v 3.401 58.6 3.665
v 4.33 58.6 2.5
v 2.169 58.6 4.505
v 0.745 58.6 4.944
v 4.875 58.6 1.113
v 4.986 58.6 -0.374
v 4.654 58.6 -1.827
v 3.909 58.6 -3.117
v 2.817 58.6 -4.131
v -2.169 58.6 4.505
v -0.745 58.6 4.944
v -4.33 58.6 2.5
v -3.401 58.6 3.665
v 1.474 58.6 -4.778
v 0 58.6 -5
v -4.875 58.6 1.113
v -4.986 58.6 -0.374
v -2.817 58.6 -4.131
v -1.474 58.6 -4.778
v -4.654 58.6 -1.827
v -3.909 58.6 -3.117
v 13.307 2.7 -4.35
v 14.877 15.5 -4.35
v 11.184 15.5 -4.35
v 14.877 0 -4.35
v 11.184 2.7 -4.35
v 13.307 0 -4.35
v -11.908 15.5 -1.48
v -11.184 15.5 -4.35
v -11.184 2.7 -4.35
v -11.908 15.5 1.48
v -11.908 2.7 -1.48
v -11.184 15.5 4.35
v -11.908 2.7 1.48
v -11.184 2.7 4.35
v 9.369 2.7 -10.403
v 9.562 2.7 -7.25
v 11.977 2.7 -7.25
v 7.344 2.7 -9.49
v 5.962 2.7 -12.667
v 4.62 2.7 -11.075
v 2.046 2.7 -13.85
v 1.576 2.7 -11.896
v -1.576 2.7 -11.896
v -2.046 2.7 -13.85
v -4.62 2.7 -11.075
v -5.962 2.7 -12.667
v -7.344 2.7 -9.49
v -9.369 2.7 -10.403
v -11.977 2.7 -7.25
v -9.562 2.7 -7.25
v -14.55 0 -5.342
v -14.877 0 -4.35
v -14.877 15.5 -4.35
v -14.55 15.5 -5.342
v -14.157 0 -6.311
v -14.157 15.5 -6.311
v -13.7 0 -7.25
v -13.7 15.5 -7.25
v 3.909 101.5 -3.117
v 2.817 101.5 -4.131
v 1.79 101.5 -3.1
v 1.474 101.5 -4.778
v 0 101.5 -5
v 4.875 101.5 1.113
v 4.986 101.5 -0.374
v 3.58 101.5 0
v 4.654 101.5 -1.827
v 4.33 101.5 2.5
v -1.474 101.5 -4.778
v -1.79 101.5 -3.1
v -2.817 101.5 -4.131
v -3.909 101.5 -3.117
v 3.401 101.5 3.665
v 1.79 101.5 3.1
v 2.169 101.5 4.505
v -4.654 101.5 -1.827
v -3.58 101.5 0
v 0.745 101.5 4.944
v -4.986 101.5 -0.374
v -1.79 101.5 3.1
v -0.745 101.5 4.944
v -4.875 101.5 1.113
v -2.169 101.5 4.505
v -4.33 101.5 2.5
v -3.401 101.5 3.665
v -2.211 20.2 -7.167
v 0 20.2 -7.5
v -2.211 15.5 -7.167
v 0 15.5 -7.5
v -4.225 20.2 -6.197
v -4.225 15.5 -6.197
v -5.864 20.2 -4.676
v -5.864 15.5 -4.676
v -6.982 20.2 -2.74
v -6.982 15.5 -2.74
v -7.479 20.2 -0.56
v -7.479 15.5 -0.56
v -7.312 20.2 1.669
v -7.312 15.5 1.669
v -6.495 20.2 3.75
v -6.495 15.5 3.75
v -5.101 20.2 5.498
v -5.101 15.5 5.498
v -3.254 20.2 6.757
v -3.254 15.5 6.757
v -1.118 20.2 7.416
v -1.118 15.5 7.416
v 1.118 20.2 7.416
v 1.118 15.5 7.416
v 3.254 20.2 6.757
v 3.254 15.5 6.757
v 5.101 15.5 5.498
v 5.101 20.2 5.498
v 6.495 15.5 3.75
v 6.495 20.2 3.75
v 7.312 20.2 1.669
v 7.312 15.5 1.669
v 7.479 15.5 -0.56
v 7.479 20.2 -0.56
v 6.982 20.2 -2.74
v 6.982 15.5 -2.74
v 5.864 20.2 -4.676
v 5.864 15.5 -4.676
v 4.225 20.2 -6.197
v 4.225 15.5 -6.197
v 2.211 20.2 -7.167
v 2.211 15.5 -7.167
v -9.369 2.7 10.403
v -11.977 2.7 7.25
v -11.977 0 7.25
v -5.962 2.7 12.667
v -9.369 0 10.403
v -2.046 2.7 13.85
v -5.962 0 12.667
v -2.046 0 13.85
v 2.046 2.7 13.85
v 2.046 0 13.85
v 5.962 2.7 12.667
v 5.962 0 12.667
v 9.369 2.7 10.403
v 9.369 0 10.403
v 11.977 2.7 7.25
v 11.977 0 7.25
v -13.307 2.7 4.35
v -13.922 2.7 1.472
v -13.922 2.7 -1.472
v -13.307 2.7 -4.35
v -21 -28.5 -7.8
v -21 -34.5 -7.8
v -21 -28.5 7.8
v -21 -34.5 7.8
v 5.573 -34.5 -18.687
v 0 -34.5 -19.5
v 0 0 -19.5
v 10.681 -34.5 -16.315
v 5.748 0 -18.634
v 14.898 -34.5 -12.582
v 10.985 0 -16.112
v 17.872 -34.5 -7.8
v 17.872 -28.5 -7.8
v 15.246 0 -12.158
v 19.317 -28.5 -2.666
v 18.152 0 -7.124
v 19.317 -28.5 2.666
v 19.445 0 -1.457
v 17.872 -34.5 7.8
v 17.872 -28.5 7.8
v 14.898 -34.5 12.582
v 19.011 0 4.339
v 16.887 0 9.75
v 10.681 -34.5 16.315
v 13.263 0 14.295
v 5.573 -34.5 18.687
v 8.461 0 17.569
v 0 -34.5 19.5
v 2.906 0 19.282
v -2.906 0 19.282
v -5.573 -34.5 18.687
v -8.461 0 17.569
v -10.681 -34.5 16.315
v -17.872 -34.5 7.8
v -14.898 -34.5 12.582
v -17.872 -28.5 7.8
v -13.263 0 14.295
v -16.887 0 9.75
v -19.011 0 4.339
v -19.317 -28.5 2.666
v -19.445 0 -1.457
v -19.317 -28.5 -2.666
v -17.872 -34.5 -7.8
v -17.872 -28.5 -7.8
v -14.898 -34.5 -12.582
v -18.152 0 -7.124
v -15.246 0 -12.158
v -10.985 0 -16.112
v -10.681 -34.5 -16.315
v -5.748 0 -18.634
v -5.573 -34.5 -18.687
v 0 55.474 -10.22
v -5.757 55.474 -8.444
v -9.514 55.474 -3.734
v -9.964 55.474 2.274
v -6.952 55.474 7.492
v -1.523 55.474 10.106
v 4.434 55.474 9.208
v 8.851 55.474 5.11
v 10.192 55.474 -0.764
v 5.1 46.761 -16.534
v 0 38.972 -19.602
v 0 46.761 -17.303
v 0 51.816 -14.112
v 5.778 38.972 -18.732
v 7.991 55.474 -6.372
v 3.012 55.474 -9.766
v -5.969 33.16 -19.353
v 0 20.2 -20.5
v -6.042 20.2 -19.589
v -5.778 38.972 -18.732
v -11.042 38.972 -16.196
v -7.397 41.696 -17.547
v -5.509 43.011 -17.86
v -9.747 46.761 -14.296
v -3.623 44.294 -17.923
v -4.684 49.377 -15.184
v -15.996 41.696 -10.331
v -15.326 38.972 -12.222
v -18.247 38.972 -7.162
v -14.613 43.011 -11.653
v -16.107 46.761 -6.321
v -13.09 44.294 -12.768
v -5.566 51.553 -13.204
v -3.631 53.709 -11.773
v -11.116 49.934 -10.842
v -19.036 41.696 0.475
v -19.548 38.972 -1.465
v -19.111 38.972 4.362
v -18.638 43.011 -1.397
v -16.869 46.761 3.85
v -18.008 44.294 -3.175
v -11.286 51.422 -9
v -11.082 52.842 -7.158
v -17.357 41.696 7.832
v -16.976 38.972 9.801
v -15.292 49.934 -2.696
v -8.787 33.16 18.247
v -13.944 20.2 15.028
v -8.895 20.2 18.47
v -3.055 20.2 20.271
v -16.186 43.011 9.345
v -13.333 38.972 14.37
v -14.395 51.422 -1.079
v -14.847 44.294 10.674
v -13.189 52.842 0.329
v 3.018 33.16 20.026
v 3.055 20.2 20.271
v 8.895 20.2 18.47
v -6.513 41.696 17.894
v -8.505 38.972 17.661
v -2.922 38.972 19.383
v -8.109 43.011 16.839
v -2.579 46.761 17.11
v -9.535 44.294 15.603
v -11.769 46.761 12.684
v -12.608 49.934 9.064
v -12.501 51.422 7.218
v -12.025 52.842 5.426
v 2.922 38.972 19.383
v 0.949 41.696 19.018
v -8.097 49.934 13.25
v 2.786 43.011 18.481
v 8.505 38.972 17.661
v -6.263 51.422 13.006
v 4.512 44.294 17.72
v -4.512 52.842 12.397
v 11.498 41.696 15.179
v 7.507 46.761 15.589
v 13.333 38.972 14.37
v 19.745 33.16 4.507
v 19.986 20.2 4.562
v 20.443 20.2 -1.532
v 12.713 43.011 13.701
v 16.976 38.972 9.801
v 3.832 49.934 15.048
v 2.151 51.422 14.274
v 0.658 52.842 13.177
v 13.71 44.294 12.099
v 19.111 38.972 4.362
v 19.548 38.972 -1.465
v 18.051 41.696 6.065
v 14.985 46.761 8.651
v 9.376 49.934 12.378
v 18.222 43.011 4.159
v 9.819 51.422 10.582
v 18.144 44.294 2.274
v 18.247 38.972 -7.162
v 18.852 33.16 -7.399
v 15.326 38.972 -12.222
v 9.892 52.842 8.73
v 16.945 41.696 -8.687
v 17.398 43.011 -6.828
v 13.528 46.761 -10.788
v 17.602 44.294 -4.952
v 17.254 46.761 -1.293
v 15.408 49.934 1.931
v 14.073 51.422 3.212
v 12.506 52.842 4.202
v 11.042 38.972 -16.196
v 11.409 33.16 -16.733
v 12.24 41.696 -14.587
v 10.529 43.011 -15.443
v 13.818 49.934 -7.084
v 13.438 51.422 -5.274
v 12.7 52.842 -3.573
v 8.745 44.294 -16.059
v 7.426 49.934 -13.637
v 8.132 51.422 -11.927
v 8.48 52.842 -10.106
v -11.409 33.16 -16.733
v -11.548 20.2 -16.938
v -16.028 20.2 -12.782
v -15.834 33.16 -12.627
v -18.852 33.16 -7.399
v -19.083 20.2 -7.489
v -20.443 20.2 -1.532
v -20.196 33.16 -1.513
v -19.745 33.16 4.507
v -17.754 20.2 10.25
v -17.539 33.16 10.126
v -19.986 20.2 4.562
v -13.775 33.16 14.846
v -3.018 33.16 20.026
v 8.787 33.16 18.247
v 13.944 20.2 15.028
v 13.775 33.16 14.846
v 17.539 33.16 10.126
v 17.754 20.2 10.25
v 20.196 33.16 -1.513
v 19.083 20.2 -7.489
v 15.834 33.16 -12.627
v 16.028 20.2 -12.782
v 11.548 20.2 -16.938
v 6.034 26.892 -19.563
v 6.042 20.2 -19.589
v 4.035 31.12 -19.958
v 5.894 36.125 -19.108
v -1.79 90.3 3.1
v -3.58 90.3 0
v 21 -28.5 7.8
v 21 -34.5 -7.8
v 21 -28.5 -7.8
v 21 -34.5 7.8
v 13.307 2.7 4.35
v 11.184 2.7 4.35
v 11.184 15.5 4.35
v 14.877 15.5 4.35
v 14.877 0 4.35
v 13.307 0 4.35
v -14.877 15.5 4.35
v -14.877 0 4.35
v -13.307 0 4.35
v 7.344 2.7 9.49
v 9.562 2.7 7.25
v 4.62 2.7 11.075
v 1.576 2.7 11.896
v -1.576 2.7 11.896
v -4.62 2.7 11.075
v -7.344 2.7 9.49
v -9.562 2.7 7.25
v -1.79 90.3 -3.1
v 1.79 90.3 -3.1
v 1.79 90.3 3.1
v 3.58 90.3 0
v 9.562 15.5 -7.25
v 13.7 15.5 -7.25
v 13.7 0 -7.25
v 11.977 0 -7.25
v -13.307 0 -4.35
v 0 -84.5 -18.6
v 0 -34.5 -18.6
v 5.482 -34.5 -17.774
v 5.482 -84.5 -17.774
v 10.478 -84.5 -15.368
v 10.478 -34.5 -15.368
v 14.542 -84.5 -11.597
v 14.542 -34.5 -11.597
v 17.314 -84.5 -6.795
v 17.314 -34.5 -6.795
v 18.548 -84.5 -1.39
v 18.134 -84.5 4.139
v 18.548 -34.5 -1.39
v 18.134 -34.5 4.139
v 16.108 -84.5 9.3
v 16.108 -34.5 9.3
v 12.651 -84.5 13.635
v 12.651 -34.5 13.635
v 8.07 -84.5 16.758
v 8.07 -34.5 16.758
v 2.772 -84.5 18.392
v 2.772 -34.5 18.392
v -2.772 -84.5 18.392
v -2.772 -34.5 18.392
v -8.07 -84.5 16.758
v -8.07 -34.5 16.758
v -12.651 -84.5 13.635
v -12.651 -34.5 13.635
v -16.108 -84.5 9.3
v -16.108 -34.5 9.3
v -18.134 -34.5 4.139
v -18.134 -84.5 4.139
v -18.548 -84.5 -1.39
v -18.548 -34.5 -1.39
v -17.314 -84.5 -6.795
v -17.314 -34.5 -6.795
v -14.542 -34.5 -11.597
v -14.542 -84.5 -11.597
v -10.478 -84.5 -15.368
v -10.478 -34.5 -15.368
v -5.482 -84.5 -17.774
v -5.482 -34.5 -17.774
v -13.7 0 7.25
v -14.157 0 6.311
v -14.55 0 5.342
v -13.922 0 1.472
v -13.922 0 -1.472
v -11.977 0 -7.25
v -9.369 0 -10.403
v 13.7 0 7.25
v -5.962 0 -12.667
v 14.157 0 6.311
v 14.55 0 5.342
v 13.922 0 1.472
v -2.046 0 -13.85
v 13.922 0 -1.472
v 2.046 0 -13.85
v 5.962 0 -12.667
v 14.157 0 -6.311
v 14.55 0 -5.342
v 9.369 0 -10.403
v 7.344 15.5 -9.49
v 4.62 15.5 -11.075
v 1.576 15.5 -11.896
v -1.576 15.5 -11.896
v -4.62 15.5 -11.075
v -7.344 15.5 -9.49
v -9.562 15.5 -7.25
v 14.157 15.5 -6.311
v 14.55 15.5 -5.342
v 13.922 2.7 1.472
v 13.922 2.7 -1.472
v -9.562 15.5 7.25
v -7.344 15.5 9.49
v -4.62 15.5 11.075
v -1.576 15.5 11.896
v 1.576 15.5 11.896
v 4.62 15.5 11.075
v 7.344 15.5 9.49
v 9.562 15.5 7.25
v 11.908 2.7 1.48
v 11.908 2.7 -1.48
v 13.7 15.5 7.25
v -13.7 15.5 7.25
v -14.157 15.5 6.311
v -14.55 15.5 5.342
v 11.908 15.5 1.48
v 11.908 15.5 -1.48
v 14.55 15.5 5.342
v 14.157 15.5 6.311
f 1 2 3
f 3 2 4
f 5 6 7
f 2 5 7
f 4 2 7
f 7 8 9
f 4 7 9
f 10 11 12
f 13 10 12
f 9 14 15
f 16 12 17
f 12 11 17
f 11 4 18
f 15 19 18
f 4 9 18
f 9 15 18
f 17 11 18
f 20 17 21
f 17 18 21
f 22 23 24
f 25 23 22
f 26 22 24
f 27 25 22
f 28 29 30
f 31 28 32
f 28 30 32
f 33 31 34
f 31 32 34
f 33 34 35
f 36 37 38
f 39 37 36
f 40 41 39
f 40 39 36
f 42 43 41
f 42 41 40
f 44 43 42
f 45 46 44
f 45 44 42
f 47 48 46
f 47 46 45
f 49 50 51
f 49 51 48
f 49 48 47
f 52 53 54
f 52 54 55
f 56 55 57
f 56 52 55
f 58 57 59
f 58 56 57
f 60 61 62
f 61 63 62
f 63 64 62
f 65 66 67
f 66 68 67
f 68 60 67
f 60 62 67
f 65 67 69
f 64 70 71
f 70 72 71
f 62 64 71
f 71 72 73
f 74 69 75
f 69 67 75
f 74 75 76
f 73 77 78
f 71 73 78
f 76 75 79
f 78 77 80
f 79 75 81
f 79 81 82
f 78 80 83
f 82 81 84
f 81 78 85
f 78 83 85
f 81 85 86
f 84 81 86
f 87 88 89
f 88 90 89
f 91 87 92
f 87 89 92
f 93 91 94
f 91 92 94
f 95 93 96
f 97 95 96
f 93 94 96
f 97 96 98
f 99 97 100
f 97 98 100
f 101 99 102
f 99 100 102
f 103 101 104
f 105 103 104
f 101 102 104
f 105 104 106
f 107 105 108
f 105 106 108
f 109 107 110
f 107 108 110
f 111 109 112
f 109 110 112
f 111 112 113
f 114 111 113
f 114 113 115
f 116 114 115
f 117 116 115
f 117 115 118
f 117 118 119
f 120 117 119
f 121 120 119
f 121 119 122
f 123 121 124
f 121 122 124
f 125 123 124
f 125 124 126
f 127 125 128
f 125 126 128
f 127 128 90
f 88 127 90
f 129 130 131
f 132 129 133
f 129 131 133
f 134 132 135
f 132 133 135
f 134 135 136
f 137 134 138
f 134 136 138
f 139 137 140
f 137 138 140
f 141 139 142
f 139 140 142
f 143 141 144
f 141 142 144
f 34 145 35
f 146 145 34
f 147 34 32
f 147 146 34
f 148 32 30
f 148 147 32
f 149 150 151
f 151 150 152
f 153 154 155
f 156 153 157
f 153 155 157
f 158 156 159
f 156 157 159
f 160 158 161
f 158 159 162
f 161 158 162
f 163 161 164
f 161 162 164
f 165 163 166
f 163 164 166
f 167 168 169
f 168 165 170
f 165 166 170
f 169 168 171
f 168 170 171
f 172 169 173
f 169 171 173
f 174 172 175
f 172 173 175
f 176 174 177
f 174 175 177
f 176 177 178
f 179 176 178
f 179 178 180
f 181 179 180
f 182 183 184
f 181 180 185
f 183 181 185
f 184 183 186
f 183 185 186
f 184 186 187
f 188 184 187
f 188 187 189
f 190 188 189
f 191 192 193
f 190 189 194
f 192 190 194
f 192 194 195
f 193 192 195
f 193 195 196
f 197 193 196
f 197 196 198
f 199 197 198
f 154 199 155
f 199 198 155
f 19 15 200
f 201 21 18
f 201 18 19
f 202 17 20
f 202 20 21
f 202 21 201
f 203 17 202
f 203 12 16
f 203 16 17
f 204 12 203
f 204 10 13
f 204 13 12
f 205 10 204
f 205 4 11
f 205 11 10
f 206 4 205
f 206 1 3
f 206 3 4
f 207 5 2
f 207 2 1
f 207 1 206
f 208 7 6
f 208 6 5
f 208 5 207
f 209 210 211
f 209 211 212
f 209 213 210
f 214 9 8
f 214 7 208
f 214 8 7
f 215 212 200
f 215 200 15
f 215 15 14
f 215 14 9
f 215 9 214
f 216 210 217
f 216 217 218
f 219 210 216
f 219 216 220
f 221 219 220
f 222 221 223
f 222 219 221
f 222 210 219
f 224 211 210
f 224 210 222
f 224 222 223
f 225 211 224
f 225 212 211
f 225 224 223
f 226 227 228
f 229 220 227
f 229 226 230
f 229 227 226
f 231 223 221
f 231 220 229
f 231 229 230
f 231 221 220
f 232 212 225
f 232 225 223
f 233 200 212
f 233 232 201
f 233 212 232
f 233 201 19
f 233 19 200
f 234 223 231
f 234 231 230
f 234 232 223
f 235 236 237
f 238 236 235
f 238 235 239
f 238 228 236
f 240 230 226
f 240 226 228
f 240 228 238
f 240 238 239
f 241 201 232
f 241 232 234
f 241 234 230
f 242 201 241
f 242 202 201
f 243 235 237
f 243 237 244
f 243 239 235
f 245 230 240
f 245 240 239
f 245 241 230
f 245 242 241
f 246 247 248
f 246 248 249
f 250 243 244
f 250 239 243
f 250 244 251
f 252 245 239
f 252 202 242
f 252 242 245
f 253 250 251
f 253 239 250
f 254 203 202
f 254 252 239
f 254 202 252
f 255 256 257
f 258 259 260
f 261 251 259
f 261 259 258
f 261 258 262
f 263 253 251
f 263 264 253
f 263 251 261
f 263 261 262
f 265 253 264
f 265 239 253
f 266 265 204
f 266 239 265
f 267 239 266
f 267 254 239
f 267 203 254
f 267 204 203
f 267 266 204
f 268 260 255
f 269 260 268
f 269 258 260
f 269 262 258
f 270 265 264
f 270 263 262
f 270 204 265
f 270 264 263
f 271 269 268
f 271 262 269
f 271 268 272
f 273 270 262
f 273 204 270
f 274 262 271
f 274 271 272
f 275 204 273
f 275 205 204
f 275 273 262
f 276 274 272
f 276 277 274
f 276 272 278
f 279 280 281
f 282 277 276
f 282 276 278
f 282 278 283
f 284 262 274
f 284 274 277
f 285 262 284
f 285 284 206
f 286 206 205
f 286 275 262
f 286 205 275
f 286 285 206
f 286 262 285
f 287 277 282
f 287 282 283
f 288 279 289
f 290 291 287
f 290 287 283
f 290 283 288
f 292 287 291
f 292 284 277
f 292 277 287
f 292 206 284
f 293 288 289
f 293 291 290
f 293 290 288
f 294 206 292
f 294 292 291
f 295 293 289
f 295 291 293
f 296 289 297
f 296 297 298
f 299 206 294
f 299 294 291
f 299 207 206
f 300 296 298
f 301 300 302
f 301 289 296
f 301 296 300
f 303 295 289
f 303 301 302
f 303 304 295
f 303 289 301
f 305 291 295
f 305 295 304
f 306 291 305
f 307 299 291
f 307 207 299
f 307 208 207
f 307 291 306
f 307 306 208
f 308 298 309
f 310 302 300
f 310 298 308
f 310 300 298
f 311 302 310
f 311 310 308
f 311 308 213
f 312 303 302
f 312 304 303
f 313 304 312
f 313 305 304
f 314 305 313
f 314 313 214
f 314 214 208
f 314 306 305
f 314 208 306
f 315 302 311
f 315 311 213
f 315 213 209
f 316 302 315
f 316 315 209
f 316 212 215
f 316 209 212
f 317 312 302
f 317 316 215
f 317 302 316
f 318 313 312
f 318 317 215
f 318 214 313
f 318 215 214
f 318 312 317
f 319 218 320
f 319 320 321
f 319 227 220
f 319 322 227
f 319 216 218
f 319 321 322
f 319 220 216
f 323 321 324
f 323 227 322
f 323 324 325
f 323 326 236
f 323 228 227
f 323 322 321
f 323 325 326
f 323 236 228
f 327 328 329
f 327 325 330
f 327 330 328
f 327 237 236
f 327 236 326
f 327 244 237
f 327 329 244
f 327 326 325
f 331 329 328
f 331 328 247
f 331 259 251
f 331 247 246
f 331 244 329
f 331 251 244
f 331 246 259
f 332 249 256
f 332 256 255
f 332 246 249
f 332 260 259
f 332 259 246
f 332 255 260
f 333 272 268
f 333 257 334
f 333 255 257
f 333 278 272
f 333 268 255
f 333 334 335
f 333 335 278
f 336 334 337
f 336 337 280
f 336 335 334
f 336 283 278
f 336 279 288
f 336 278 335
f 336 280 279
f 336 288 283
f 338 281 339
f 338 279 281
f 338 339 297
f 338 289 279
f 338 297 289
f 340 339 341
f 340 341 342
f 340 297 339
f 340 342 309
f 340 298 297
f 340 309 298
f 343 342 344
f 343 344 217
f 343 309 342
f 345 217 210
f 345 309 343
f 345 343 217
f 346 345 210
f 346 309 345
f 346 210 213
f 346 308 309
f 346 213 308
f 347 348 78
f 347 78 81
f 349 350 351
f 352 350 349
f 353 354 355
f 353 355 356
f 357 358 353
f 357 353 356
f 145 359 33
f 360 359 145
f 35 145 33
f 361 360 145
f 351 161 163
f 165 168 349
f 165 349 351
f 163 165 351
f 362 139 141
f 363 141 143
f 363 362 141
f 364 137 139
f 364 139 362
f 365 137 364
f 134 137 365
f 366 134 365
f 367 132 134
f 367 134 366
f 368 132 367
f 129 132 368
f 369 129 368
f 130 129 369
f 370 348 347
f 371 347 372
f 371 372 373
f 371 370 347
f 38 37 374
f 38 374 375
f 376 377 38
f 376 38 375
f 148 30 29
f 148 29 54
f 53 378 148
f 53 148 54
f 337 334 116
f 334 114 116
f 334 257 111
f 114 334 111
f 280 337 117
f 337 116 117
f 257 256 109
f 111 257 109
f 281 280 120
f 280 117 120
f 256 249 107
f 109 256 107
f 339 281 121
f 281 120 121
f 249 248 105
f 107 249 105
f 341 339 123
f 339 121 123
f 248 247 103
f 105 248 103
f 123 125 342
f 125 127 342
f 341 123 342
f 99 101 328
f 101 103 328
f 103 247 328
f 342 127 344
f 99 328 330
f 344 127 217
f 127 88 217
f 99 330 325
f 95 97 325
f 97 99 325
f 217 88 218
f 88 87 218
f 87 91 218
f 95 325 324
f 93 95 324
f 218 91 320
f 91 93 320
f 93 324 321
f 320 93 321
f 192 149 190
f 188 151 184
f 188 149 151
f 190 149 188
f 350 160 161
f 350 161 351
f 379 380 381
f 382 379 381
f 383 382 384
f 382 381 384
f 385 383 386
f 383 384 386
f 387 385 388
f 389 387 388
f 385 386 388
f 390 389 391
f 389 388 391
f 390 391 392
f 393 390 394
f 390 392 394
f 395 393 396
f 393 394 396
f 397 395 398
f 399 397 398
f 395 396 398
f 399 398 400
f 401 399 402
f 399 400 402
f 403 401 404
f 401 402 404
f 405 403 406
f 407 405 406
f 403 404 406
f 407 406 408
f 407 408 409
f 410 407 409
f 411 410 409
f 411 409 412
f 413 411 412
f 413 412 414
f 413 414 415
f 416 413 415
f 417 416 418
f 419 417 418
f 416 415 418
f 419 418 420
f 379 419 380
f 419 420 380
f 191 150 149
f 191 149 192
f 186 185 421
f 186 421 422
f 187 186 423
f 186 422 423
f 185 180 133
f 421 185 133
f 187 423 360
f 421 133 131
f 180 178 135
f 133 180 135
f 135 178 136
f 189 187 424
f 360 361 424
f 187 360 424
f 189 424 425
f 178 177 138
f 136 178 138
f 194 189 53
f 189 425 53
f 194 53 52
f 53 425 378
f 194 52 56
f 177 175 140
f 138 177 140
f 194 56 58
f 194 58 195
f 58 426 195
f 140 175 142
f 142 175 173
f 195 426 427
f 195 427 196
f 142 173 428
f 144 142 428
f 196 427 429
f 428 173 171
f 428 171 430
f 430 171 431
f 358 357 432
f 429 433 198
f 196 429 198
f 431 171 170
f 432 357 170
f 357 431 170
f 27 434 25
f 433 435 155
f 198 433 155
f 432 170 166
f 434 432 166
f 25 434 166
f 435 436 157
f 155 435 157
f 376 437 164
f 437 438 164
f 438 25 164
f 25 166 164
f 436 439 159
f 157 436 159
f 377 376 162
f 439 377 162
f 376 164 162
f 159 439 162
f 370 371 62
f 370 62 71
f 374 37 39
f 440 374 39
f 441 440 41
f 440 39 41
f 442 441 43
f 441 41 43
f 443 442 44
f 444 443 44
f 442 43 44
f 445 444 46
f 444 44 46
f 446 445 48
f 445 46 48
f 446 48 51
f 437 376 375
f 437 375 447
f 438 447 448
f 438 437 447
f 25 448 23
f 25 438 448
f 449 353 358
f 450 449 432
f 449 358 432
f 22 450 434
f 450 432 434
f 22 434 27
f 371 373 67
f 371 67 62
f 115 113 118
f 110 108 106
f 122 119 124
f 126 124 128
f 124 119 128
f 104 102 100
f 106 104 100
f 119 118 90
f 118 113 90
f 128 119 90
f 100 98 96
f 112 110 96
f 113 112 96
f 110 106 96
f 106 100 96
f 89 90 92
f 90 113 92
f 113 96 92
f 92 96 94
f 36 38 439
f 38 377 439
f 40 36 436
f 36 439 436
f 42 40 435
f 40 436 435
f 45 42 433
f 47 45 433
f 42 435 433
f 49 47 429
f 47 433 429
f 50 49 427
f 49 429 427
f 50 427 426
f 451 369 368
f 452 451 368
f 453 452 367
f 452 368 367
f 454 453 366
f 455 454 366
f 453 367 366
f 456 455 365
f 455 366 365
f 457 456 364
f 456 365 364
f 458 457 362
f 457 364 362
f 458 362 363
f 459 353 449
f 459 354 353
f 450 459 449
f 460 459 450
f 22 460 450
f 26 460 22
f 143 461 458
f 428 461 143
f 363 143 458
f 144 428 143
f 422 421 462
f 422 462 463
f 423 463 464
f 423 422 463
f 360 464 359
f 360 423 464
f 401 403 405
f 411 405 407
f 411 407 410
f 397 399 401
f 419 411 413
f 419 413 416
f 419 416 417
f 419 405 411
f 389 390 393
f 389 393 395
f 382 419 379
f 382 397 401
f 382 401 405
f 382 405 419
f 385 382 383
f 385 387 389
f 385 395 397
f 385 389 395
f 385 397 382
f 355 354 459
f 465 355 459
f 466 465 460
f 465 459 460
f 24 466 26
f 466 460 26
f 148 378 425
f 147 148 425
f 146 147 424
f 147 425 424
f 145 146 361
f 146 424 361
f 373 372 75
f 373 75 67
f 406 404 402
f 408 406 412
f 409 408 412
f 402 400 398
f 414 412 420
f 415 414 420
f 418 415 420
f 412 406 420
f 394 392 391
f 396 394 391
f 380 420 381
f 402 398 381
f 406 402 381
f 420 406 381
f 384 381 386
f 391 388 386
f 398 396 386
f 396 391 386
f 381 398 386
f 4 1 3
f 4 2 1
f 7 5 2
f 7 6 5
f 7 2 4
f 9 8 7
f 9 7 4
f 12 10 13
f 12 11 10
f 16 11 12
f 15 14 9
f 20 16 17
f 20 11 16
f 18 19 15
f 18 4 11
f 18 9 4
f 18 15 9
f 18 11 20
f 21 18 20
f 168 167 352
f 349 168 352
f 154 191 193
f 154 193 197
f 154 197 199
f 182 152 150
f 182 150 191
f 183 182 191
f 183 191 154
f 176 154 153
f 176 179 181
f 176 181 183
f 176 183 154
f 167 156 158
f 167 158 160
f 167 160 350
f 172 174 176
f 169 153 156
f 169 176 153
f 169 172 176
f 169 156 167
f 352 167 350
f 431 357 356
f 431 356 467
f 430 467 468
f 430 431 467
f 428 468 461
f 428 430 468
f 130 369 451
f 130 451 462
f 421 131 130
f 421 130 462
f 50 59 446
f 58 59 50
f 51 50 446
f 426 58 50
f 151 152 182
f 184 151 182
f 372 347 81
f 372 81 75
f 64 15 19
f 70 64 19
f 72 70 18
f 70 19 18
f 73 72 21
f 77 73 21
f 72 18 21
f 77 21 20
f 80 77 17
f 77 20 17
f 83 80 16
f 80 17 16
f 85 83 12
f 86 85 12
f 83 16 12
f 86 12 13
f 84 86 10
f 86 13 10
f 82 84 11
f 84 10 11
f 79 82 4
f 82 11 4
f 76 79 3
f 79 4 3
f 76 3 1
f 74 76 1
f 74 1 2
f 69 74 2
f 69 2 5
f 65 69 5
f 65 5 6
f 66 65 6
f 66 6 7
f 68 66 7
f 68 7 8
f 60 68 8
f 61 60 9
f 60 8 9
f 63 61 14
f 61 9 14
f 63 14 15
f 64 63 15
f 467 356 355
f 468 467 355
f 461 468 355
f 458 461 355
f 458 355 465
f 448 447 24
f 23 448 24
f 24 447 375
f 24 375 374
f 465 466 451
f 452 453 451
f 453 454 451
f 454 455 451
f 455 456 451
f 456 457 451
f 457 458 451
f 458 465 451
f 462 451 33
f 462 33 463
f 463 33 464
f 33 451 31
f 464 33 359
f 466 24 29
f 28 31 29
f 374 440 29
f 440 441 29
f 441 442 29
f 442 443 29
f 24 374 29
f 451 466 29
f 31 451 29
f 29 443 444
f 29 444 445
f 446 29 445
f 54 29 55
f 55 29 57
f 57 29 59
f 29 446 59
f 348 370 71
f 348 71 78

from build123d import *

# Parameters (mm, degrees)
SKETCH1_R              = 14
BOSS_EXTRUDE1_DEPTH    = 2.7
SKETCH2_R              = 12
BOSS_EXTRUDE2_DEPTH    = 15.5
BOSS_EXTRUDE3_DEPTH    = 15.5
SKETCH4_R              = 19.5
BOSS_EXTRUDE4_DEPTH    = 34.5
SKETCH5_W              = 42
SKETCH5_H              = 15.6
BOSS_EXTRUDE5_DEPTH    = 6
SKETCH6_R              = 18.6
BOSS_EXTRUDE6_DEPTH    = 50
SPLIT1_SURFACE_1_BACK  = 196.041
SPLIT1_SURFACE_1_DEPTH = 392.082
SPLIT1_SURFACE_2_BACK  = 196.041
SPLIT1_SURFACE_2_DEPTH = 392.082
CUT_EXTRUDE1_DEPTH     = 11.2


with BuildPart() as part:
    # Sketch1 → Boss-Extrude1 (new body)
    with BuildSketch(Plane(origin=(0, 0, 0), x_dir=(1, 0, 0), z_dir=(0, 1, 0))):
        with Locations(Location((0, 0, 0), (0, 0, 90))):
            Circle(SKETCH1_R)
    extrude(amount=BOSS_EXTRUDE1_DEPTH)

    # Sketch2 → Boss-Extrude2 (add)
    with BuildSketch(Plane(origin=(0, 0, 0), x_dir=(1, 0, 0), z_dir=(0, 1, 0))):
        with Locations(Location((0, 0, 0), (0, 0, 270))):
            Circle(SKETCH2_R)
    extrude(amount=BOSS_EXTRUDE2_DEPTH)

    # Sketch3 → Boss-Extrude3 (add)
    with BuildSketch(Plane(origin=(0, 0, 0), x_dir=(1, 0, 0), z_dir=(0, 1, 0))):
        with BuildLine():
            ThreePointArc((13.699908759, 7.25), (14.361878956, 5.829788405), (14.877079687, 4.35))
            Line((14.877079687, 4.35), (-14.877079687, 4.35))
            ThreePointArc((-14.877079687, 4.35), (-14.361878956, 5.829788405), (-13.699908759, 7.25))
            Line((-13.699908759, 7.25), (13.699908759, 7.25))
        make_face()
        with BuildLine():
            ThreePointArc((-13.699908759, -7.25), (-14.361878956, -5.829788405), (-14.877079687, -4.35))
            Line((-14.877079687, -4.35), (14.877079687, -4.35))
            ThreePointArc((14.877079687, -4.35), (14.361878956, -5.829788405), (13.699908759, -7.25))
            Line((13.699908759, -7.25), (-13.699908759, -7.25))
        make_face()
    extrude(amount=BOSS_EXTRUDE3_DEPTH)

    # Sketch4 → Boss-Extrude4 (add)
    with BuildSketch(Plane.XZ):
        with Locations(Location((0, 0, 0), (0, 0, 270))):
            Circle(SKETCH4_R)
    extrude(amount=BOSS_EXTRUDE4_DEPTH)

    # Sketch5 → Boss-Extrude5 (add)
    with BuildSketch(Plane.XZ.offset(34.5)):
        Rectangle(SKETCH5_W, SKETCH5_H)
    extrude(amount=-BOSS_EXTRUDE5_DEPTH)


with BuildPart() as body_2:
    # Sketch6 → Boss-Extrude6 (new body)
    with BuildSketch(Plane.XZ.offset(34.5)):
        with Locations(Location((0, 0, 0), (0, 0, 270))):
            Circle(SKETCH6_R)
    extrude(amount=BOSS_EXTRUDE6_DEPTH)


with BuildPart() as body_3:
    # Sketch7 → Revolve1 (revolve)
    with BuildSketch(Plane.XY, mode=Mode.PRIVATE) as revolve1_sk:
        with BuildLine():
            Line((0, 15.5), (0, 20.2))
            Line((0, 20.2), (0, 101.5))
            Line((0, 101.5), (5, 101.5))
            Line((5, 101.5), (5, 58.6))
            add(Edge.make_bspline(
                [(20.5, 20.2), (20.474499301, 37.432747691), (20.866112575, 50.996454144), (5, 58.6)],
                knots=[0, 0, 0, 0, 1, 1, 1, 1], degree=3))
            Line((20.5, 20.2), (7.5, 20.2))
            Line((7.5, 20.2), (7.5, 15.5))
            Line((7.5, 15.5), (0, 15.5))
        make_face()
    revolve(revolve1_sk.sketch.rotate(Axis((0, 20.2, 0), (0, 1, 0)), 90), axis=Axis((0, 20.2, 0), (0, 1, 0)))


with BuildPart() as body_4:
    # Split1: the piece behind the surface
    add(body_3.part)
    # Split1 surface: a surface, the sketch's curves swept straight by 392.082 mm
    with BuildLine(Plane.XY.offset(-SPLIT1_SURFACE_1_BACK), mode=Mode.PRIVATE) as split1_surface_1_path:
        Line((5, 58.6), (-5, 58.6))
    split1_surface_1 = Shell.extrude(split1_surface_1_path.wire(), (0 * SPLIT1_SURFACE_1_DEPTH, 0 * SPLIT1_SURFACE_1_DEPTH, 1 * SPLIT1_SURFACE_1_DEPTH))
    split(bisect_by=split1_surface_1, keep=Keep.BOTTOM)

    # Sketch9 → Cut-Extrude1 (cut)
    with BuildSketch(Plane(origin=(0, 101.5, 0), x_dir=(1, 0, 0), z_dir=(0, 1, 0))):
        Polygon((3.579571669, 0), (1.789785834, 3.1), (-1.789785834, 3.1), (-3.579571669, 0), (-1.789785834, -3.1), (1.789785834, -3.1), align=None)
    extrude(amount=-CUT_EXTRUDE1_DEPTH, mode=Mode.SUBTRACT)


with BuildPart() as body_3_1:
    add(body_3.part)

    # Split1: split by a surface, the side it looks to stays
    # Split1 surface: a surface, the sketch's curves swept straight by 392.082 mm
    with BuildLine(Plane.XY.offset(-SPLIT1_SURFACE_2_BACK), mode=Mode.PRIVATE) as split1_surface_2_path:
        Line((5, 58.6), (-5, 58.6))
    split1_surface_2 = Shell.extrude(split1_surface_2_path.wire(), (0 * SPLIT1_SURFACE_2_DEPTH, 0 * SPLIT1_SURFACE_2_DEPTH, 1 * SPLIT1_SURFACE_2_DEPTH))
    split(bisect_by=split1_surface_2, keep=Keep.TOP)


solid = Compound([part.part, body_2.part, body_4.part, body_3_1.part])
